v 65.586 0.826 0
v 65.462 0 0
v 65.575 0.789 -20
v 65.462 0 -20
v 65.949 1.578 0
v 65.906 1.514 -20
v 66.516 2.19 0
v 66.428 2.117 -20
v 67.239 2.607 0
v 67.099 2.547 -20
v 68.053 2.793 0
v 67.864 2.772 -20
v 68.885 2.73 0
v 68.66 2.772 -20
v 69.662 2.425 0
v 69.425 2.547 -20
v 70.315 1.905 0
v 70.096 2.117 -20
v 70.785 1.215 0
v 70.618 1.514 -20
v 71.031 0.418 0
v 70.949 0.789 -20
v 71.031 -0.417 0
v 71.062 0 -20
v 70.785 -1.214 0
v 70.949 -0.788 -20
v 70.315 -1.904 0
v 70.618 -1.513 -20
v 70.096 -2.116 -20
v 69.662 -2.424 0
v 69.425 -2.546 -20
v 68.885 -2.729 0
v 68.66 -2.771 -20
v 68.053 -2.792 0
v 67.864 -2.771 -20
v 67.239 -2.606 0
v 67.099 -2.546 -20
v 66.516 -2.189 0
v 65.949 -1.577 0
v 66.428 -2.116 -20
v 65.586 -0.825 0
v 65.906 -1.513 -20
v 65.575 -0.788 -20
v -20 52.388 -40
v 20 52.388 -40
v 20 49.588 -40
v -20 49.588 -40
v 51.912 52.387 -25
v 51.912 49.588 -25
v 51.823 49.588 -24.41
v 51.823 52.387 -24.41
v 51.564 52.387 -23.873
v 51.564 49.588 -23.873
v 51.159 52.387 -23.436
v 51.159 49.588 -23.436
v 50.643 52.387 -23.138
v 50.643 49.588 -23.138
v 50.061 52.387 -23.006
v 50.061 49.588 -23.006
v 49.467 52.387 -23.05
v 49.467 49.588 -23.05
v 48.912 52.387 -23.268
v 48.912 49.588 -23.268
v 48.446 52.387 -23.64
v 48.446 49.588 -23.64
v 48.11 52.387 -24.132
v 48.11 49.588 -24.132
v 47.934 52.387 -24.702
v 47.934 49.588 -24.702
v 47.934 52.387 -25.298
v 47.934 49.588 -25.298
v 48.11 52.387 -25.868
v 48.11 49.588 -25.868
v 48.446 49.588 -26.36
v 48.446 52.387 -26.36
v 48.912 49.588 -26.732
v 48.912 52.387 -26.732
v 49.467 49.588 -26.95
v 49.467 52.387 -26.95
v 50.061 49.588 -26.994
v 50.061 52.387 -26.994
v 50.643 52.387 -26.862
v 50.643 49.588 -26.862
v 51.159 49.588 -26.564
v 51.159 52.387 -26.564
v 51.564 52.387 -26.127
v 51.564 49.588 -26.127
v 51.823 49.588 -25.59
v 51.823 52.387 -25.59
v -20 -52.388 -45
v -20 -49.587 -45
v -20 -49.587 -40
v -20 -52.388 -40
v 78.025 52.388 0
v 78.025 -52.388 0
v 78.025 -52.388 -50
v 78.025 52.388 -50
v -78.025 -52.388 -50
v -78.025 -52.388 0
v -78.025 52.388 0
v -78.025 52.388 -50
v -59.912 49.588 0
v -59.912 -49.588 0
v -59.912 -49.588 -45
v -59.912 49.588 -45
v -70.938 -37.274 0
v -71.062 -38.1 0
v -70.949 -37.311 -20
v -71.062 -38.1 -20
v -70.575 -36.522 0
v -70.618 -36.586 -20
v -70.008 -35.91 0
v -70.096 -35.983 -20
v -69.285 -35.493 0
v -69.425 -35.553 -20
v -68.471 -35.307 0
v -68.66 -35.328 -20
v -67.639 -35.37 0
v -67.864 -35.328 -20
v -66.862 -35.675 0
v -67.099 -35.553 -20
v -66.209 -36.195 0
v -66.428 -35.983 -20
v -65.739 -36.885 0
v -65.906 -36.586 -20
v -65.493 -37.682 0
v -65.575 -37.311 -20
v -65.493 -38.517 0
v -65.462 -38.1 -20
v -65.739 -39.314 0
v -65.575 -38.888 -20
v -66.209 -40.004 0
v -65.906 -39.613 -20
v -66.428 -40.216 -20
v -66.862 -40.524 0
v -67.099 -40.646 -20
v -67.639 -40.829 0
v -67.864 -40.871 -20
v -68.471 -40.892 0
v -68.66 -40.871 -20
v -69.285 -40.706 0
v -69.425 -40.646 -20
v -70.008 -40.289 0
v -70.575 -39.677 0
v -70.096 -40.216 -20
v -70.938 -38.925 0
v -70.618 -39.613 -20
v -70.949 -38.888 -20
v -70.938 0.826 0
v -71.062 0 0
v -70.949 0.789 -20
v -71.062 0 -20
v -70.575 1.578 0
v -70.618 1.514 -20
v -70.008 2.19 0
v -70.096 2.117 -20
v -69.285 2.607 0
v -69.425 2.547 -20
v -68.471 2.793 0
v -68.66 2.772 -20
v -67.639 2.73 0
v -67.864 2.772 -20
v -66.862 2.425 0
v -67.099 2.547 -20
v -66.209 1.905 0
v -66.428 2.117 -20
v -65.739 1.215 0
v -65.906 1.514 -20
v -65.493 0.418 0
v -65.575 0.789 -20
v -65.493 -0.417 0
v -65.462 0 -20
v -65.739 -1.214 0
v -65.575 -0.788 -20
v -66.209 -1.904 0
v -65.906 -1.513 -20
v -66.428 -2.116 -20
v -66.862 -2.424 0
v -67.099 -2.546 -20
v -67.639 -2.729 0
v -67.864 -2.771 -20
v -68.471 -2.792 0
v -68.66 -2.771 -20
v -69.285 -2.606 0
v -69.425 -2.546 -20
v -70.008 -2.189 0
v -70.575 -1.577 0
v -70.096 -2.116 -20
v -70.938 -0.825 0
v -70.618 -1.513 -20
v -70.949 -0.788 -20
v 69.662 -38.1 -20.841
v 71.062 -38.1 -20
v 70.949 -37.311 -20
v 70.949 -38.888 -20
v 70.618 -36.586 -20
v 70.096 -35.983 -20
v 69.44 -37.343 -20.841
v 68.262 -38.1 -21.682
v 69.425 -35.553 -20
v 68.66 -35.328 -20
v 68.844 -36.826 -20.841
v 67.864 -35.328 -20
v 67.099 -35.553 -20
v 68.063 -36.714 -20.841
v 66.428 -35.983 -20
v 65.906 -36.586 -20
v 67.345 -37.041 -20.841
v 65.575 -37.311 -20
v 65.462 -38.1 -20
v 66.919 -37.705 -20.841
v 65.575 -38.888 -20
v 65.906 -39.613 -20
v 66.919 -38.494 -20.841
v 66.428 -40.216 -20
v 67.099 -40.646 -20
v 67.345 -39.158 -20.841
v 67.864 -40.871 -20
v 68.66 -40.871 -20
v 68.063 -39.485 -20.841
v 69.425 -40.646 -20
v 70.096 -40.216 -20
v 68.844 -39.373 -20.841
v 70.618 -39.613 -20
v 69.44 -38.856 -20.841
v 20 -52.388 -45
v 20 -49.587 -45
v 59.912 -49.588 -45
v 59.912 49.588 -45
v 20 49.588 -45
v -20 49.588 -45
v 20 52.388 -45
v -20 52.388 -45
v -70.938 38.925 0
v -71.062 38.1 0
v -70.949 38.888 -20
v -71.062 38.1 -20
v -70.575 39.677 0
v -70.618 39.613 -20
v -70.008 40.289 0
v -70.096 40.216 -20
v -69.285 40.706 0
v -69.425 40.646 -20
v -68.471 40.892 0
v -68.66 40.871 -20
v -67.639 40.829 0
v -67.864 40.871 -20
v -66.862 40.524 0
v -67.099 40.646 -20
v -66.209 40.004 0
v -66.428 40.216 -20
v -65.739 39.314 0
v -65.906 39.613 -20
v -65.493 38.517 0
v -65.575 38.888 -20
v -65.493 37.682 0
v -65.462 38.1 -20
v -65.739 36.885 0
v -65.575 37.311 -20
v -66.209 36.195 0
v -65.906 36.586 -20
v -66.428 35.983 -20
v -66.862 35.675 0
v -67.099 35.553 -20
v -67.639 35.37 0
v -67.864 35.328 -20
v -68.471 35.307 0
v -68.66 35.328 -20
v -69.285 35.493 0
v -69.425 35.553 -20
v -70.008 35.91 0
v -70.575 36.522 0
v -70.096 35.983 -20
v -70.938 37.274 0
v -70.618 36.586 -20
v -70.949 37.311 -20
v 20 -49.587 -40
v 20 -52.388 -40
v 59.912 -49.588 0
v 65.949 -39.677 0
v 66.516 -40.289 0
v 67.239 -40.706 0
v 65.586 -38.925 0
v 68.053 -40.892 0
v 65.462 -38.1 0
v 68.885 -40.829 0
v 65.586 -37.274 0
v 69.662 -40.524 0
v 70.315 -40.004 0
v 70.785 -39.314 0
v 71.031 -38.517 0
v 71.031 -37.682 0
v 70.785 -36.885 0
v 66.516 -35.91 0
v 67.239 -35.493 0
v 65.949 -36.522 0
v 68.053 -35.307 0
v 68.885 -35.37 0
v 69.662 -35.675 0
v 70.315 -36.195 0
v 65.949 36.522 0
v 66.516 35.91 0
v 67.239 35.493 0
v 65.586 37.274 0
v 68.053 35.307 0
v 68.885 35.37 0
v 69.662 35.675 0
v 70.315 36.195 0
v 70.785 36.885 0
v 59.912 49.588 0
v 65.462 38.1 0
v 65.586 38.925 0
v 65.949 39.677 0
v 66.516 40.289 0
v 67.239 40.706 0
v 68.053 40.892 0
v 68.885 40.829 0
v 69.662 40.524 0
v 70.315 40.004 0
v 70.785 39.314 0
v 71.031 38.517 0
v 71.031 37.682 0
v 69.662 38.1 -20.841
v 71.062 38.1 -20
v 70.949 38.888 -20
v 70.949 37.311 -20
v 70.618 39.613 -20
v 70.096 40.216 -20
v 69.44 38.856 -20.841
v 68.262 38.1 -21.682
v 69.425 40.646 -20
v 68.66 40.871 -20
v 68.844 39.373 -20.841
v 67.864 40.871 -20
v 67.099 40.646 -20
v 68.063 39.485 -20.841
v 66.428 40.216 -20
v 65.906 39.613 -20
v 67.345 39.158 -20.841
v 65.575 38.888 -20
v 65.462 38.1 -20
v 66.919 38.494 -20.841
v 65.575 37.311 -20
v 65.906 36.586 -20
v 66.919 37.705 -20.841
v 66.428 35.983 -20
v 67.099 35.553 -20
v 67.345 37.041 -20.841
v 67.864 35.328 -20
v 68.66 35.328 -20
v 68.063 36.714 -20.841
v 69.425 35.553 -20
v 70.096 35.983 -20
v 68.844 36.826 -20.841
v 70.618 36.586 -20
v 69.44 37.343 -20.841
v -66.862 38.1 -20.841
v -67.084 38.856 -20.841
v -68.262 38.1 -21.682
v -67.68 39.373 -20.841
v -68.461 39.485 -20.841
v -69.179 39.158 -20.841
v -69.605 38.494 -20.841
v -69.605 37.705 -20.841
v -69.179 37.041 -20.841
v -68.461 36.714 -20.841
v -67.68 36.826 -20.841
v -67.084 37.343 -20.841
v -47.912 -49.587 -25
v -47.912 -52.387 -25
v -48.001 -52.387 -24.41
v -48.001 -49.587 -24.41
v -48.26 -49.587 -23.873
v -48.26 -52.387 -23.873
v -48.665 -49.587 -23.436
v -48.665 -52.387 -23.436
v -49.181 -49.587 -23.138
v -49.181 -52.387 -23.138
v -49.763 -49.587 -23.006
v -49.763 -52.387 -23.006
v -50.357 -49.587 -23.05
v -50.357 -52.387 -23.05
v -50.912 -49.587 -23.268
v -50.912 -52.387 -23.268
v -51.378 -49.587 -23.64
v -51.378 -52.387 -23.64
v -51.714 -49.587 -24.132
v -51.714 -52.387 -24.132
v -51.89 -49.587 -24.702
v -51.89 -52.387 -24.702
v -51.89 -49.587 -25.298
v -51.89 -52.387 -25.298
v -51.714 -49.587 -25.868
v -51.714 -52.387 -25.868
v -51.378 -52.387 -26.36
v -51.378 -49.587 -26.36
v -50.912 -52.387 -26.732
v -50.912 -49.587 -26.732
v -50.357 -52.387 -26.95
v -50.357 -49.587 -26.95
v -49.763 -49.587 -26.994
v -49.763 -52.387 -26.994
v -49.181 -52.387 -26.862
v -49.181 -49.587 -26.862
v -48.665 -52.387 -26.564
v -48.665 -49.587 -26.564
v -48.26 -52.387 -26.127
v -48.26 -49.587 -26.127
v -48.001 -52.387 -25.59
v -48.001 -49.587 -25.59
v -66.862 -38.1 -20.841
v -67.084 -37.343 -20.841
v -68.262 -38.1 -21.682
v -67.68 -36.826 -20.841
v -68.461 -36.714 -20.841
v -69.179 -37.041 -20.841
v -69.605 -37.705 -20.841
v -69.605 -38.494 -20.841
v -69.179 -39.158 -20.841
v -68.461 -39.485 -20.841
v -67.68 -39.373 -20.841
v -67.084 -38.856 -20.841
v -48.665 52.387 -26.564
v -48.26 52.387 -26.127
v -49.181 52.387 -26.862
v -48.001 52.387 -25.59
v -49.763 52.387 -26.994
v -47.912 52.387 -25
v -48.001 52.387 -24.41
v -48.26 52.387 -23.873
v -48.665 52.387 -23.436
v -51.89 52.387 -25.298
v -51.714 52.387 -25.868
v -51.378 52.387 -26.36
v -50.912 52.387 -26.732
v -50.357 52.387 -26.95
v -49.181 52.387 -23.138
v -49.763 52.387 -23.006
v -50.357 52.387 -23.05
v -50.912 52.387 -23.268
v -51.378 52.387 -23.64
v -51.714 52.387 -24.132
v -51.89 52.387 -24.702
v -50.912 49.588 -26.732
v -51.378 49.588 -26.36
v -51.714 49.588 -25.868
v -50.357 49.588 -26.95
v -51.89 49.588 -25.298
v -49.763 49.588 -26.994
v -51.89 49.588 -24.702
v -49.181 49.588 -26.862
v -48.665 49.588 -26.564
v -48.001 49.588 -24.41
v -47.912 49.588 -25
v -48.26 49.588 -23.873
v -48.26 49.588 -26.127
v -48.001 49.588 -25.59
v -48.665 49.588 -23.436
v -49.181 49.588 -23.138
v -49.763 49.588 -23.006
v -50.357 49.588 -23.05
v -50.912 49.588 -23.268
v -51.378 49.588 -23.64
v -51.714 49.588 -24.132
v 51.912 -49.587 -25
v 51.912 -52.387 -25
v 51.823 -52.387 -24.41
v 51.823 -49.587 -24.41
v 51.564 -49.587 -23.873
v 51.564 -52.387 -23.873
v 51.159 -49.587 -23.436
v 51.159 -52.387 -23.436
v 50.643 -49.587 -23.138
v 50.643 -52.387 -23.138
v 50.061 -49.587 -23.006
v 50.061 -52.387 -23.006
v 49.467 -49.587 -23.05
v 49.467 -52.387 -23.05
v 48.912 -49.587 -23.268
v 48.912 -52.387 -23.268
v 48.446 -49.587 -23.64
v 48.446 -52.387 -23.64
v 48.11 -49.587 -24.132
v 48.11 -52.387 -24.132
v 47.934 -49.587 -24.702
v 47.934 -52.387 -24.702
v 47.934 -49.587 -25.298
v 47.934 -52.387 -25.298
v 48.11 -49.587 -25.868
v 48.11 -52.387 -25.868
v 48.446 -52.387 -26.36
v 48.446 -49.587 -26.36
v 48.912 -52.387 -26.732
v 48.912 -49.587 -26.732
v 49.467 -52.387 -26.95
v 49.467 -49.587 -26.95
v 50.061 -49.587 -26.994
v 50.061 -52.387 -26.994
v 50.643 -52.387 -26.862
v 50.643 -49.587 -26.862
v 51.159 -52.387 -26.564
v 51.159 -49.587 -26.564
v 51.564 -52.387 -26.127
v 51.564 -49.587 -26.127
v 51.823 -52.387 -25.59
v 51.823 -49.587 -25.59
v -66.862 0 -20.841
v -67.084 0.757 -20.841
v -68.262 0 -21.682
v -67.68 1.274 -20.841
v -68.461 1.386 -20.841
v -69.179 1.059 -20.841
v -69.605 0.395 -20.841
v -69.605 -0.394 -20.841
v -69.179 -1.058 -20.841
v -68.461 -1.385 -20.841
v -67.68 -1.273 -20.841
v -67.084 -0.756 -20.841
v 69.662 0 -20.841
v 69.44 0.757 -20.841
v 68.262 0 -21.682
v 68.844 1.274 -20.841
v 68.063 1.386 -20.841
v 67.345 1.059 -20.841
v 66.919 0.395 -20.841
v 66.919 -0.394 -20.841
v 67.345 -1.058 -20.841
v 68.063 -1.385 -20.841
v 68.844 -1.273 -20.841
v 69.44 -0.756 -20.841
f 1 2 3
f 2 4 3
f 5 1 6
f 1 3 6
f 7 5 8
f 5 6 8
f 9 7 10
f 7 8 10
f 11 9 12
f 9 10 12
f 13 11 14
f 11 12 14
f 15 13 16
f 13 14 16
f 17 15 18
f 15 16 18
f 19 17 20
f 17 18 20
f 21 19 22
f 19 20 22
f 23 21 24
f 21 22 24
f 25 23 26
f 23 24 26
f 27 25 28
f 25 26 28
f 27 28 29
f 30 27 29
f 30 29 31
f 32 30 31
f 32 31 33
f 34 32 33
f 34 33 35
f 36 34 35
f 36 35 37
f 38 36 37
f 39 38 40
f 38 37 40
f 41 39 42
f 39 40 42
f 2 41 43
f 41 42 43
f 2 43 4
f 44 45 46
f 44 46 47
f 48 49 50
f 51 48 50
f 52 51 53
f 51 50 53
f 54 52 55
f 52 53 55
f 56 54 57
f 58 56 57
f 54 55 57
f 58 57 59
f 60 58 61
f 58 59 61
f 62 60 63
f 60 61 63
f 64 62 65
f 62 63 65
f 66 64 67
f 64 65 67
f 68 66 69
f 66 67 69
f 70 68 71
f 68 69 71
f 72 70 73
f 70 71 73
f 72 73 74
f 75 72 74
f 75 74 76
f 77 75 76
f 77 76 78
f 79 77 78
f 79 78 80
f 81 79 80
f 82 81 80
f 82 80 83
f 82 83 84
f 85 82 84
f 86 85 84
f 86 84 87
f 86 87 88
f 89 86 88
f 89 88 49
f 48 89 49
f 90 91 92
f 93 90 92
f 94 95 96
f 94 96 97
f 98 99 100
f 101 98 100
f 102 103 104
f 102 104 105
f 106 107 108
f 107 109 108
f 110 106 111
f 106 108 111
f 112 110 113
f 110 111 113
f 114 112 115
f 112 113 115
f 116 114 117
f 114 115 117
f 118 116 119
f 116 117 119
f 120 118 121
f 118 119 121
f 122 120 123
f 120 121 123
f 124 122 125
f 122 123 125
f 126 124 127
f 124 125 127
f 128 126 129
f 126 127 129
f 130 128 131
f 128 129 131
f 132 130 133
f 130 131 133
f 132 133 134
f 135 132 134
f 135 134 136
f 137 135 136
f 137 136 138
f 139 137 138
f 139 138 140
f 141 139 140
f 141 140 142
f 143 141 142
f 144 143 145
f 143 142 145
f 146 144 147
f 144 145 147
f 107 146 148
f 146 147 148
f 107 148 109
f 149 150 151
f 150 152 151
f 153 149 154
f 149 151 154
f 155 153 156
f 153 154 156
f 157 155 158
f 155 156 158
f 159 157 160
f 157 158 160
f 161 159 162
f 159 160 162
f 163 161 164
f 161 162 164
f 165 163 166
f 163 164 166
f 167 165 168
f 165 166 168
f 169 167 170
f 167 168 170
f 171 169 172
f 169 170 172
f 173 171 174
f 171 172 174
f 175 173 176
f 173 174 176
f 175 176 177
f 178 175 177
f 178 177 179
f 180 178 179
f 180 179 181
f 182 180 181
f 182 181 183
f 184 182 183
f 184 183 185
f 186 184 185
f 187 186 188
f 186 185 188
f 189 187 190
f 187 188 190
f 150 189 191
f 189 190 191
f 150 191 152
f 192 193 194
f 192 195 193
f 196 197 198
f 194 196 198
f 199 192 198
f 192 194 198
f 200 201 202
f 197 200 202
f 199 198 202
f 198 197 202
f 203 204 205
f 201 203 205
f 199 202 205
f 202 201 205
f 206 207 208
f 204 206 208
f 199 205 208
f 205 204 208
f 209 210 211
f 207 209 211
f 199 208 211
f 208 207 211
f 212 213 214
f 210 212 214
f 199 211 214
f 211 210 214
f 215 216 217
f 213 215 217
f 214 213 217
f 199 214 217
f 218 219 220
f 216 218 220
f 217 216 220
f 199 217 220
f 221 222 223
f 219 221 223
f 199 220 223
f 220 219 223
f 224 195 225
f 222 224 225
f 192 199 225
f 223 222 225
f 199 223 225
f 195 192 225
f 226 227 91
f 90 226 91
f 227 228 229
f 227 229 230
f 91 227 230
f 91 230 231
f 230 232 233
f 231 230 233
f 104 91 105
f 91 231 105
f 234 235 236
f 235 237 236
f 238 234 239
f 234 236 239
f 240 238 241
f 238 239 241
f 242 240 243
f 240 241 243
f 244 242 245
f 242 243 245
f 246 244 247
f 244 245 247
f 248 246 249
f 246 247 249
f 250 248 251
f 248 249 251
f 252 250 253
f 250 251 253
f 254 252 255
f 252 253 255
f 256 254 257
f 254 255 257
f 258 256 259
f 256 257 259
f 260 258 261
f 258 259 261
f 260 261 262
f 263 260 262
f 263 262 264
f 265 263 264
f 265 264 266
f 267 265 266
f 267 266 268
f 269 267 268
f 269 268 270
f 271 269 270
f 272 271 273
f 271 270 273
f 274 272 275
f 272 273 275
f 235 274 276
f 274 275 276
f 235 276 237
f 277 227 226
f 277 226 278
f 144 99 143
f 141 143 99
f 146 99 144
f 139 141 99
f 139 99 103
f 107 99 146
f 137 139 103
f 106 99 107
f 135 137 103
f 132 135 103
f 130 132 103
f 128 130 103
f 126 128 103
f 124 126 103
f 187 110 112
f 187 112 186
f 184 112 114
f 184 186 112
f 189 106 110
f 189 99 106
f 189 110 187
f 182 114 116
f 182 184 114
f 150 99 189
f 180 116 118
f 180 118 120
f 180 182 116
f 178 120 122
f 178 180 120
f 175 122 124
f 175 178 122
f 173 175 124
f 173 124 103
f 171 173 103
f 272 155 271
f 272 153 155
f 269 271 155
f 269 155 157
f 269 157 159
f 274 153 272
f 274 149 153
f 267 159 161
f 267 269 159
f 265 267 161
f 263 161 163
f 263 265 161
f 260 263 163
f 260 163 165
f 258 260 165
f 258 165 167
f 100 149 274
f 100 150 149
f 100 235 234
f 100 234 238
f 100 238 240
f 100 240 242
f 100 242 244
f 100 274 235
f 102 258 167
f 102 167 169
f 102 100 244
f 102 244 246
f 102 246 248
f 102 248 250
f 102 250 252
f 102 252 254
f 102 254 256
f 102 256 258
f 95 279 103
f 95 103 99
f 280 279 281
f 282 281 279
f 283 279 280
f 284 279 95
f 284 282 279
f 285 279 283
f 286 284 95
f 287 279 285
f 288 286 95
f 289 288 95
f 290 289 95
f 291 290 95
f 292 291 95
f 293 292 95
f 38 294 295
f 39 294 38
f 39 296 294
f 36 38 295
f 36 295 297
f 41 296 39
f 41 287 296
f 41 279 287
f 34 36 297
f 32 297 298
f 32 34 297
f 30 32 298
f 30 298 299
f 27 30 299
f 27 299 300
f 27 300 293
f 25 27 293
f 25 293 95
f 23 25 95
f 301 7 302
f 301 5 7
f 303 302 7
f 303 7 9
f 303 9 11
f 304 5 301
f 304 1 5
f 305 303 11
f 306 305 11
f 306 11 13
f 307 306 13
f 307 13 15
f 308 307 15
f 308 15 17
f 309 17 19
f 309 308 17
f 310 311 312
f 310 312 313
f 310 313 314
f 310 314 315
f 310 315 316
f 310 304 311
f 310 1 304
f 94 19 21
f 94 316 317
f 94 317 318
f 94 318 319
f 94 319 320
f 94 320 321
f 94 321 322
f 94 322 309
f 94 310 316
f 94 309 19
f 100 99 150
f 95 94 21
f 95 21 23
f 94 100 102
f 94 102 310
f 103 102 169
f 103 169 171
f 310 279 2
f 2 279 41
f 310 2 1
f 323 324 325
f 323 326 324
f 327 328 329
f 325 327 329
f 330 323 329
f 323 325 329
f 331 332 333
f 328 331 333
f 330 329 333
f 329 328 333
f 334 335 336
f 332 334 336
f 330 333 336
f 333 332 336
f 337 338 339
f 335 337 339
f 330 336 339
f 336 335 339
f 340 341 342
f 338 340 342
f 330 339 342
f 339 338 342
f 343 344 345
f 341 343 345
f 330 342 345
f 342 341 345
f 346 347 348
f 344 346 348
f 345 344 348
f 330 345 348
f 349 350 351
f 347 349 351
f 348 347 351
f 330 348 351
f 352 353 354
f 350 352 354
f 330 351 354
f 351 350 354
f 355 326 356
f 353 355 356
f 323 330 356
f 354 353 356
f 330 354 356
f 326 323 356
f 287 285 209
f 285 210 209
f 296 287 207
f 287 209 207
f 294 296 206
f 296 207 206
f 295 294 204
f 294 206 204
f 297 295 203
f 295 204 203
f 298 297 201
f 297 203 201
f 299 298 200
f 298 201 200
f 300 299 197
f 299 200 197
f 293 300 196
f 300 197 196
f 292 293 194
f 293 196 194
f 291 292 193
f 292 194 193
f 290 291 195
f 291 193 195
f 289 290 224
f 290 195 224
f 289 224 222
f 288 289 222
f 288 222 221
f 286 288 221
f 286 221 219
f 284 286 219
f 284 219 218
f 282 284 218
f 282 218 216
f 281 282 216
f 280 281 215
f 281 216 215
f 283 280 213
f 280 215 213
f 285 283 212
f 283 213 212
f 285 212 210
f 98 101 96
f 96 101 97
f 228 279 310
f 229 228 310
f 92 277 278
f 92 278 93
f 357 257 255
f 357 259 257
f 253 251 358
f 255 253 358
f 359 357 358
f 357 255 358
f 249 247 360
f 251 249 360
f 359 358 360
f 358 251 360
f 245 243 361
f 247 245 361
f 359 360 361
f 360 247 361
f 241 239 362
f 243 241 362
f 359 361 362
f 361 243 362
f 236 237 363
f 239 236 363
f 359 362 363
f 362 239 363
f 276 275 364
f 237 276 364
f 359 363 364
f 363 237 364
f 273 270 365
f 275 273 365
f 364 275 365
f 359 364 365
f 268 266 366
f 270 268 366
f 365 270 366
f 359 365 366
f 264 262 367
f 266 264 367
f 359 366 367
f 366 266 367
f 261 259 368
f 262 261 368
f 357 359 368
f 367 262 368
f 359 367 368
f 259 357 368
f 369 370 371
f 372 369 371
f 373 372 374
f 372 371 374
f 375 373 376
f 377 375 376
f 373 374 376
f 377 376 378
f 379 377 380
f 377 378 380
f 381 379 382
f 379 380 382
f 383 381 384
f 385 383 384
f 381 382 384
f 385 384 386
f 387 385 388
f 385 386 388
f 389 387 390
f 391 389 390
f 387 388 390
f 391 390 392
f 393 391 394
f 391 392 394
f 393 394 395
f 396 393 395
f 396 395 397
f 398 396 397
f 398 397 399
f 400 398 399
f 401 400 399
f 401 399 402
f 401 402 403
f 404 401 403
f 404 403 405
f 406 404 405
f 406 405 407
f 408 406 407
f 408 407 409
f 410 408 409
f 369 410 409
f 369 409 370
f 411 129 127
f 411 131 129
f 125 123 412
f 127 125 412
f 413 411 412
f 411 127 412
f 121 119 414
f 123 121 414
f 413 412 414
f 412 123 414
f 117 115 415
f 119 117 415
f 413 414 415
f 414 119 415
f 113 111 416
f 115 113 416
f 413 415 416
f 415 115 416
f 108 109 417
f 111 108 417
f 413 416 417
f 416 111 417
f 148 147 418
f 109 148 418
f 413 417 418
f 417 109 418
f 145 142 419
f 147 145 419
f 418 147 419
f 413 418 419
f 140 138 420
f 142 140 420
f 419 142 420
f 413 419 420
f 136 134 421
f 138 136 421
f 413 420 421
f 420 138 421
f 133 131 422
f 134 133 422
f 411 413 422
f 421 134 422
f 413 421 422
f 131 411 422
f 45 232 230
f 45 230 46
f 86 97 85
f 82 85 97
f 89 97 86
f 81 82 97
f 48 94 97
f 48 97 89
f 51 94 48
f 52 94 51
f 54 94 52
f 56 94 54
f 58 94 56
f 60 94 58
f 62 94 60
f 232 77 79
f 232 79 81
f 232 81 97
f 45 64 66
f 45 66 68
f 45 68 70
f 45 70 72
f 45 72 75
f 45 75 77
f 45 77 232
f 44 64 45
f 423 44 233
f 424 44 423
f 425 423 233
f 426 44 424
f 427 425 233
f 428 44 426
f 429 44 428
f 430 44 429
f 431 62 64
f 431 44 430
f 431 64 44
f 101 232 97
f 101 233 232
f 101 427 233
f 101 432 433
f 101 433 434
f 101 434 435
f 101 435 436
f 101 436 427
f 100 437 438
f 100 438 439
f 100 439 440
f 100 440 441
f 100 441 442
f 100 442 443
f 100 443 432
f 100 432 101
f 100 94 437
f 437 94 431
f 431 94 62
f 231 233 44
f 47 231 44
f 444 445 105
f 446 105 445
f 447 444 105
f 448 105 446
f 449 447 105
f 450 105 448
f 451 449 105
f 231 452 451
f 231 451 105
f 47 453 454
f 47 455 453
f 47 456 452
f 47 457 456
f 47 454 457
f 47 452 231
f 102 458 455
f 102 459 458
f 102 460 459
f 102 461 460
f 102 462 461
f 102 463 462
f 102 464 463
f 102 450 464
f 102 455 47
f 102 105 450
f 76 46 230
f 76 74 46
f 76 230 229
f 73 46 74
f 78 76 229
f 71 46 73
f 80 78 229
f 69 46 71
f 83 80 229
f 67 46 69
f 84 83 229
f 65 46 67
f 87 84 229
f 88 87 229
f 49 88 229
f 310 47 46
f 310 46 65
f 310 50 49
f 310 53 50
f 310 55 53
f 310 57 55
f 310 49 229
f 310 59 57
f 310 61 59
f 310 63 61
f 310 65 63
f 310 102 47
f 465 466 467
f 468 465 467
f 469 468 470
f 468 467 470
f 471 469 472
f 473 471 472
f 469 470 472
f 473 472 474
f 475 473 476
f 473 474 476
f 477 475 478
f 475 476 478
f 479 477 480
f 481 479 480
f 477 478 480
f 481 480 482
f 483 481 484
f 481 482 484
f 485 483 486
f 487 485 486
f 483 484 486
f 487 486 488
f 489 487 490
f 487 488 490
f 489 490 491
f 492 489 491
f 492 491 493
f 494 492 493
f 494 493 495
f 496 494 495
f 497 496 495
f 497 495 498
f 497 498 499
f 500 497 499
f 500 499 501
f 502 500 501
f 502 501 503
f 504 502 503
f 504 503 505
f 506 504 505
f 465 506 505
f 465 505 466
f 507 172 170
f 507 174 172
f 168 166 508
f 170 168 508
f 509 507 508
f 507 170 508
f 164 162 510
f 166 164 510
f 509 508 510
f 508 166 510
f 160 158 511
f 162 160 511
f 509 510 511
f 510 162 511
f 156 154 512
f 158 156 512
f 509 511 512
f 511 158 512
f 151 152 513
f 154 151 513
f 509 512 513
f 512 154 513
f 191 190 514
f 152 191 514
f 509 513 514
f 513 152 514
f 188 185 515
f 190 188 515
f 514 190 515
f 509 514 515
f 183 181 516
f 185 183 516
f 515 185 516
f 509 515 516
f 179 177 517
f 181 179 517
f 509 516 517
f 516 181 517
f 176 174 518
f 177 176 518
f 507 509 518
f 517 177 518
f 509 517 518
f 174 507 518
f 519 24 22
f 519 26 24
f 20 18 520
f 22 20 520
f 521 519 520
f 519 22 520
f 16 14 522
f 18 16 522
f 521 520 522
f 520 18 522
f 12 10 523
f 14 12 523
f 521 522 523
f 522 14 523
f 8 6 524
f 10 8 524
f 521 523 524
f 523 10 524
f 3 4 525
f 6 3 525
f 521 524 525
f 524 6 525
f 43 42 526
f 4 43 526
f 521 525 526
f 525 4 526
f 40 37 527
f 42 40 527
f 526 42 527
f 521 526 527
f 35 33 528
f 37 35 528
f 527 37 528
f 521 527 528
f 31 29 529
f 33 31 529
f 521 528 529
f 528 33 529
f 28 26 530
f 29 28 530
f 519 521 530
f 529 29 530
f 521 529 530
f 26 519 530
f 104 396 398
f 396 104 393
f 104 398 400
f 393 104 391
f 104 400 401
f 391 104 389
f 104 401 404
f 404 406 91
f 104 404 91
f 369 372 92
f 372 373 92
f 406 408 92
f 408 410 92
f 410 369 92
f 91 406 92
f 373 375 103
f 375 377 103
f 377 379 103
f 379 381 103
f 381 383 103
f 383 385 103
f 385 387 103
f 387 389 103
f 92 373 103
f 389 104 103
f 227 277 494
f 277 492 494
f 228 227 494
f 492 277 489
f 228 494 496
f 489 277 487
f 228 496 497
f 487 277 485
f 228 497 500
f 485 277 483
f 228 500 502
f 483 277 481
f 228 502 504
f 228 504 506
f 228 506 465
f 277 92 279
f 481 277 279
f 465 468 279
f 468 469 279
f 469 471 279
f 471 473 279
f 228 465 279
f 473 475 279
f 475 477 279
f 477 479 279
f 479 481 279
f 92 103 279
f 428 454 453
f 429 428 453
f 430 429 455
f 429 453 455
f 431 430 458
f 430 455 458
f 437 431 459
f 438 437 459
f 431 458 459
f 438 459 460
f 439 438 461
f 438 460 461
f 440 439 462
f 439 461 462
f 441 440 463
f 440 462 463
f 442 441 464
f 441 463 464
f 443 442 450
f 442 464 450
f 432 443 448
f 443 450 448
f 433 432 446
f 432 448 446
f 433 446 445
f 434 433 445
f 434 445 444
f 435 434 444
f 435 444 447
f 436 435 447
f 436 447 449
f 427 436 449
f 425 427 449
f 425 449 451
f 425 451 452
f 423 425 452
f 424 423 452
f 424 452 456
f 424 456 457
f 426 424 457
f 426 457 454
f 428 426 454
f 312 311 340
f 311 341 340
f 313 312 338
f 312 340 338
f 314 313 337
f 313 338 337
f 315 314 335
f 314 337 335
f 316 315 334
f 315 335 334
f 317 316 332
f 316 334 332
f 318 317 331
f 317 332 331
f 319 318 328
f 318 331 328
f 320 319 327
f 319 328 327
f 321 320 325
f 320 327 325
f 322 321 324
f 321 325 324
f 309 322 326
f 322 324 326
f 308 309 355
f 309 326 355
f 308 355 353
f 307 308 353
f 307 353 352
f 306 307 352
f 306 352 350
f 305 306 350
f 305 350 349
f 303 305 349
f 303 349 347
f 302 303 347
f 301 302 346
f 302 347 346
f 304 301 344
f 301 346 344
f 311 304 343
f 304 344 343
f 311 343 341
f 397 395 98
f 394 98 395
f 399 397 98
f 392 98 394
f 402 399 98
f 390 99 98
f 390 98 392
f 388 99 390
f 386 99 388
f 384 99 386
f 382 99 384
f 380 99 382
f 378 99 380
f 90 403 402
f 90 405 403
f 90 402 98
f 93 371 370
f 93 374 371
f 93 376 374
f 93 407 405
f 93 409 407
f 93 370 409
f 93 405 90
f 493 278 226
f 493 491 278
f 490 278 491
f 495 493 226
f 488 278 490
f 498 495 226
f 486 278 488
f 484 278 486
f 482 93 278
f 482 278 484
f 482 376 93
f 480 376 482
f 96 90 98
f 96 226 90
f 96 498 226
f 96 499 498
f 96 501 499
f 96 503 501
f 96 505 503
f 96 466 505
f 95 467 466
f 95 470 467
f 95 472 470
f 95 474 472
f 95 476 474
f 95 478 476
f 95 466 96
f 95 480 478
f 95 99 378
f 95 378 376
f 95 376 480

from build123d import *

# Parameters (mm, degrees)
F0_W     = 5
F0_H     = 104.775
F0_W_2   = 146.05
F0_R     = 3.24
F1_DEPTH = 50
F2_W     = 119.824
F2_H     = 99.175
F3_DEPTH = 45
F4_D     = 5.6
F4_DEPTH = 20
F4_TIP   = 1.6824097333
F5_W     = 40
F5_H     = 5
F6_DEPTH = 104.776
F7_D     = 4


with BuildPart() as f1:
    # F0 (on Top) → F1 (new body)
    with BuildSketch(Plane.XY):
        with Locations((-75.525, 0)):
            Rectangle(F0_W, F0_H)
        Rectangle(F0_W_2, F0_H)
        with Locations((-68.262, -38.0995)):
            Circle(F0_R, mode=Mode.SUBTRACT)
        with Locations((68.262, -38.0995)):
            Circle(F0_R, mode=Mode.SUBTRACT)
        with Locations((-68.262, 0.0005)):
            Circle(F0_R, mode=Mode.SUBTRACT)
        with BuildLine():
            ThreePointArc((68.262, 44.4495), (61.912, 38.0995), (68.262, 31.7495))
            Line((68.262, 31.7495), (72.225, 31.7495))
            Line((72.225, 31.7495), (72.225, 6.3505))
            Line((72.225, 6.3505), (68.262, 6.3505))
            ThreePointArc((68.262, 6.3505), (61.912, 0.0005), (68.262, -6.3495))
            Line((68.262, -6.3495), (72.225, -6.3495))
            Line((72.225, -6.3495), (72.225, -31.7495))
            Line((72.225, -31.7495), (68.262, -31.7495))
            ThreePointArc((68.262, -31.7495), (61.912, -38.0995), (68.262, -44.4495))
            Line((68.262, -44.4495), (72.225, -44.4495))
            Line((72.225, -44.4495), (72.225, -51.5875))
            Line((72.225, -51.5875), (-72.225, -51.5875))
            Line((-72.225, -51.5875), (-72.225, -44.4495))
            Line((-72.225, -44.4495), (-68.262, -44.4495))
            ThreePointArc((-68.262, -44.4495), (-61.912, -38.0995), (-68.262, -31.7495))
            Line((-68.262, -31.7495), (-72.225, -31.7495))
            Line((-72.225, -31.7495), (-72.225, -6.3495))
            Line((-72.225, -6.3495), (-68.262, -6.3495))
            ThreePointArc((-68.262, -6.3495), (-61.912, 0.0005), (-68.262, 6.3505))
            Line((-68.262, 6.3505), (-72.225, 6.3505))
            Line((-72.225, 6.3505), (-72.225, 31.7495))
            Line((-72.225, 31.7495), (-68.262, 31.7495))
            ThreePointArc((-68.262, 31.7495), (-61.912, 38.0995), (-68.262, 44.4495))
            Line((-68.262, 44.4495), (-72.225, 44.4495))
            Line((-72.225, 44.4495), (-72.225, 51.5875))
            Line((-72.225, 51.5875), (72.225, 51.5875))
            Line((72.225, 51.5875), (72.225, 44.4495))
            Line((72.225, 44.4495), (68.262, 44.4495))
        make_face(mode=Mode.SUBTRACT)
        with Locations((-68.262, 38.0995)):
            Circle(F0_R, mode=Mode.SUBTRACT)
        with Locations((68.262, 0.0005)):
            Circle(F0_R, mode=Mode.SUBTRACT)
        with Locations((68.262, 38.0995)):
            Circle(F0_R, mode=Mode.SUBTRACT)
        with Locations((75.525, 0)):
            Rectangle(F0_W, F0_H)
        with Locations((-68.262, 38.0995)):
            Circle(F0_R)
        with BuildLine():
            Line((72.225, 31.7495), (68.262, 31.7495))
            ThreePointArc((68.262, 31.7495), (61.912, 38.0995), (68.262, 44.4495))
            Line((68.262, 44.4495), (72.225, 44.4495))
            Line((72.225, 44.4495), (72.225, 51.5875))
            Line((72.225, 51.5875), (-72.225, 51.5875))
            Line((-72.225, 51.5875), (-72.225, 44.4495))
            Line((-72.225, 44.4495), (-68.262, 44.4495))
            ThreePointArc((-68.262, 44.4495), (-61.912, 38.0995), (-68.262, 31.7495))
            Line((-68.262, 31.7495), (-72.225, 31.7495))
            Line((-72.225, 31.7495), (-72.225, 6.3505))
            Line((-72.225, 6.3505), (-68.262, 6.3505))
            ThreePointArc((-68.262, 6.3505), (-61.912, 0.0005), (-68.262, -6.3495))
            Line((-68.262, -6.3495), (-72.225, -6.3495))
            Line((-72.225, -6.3495), (-72.225, -31.7495))
            Line((-72.225, -31.7495), (-68.262, -31.7495))
            ThreePointArc((-68.262, -31.7495), (-61.912, -38.0995), (-68.262, -44.4495))
            Line((-68.262, -44.4495), (-72.225, -44.4495))
            Line((-72.225, -44.4495), (-72.225, -51.5875))
            Line((-72.225, -51.5875), (72.225, -51.5875))
            Line((72.225, -51.5875), (72.225, -44.4495))
            Line((72.225, -44.4495), (68.262, -44.4495))
            ThreePointArc((68.262, -44.4495), (61.912, -38.0995), (68.262, -31.7495))
            Line((68.262, -31.7495), (72.225, -31.7495))
            Line((72.225, -31.7495), (72.225, -6.3495))
            Line((72.225, -6.3495), (68.262, -6.3495))
            ThreePointArc((68.262, -6.3495), (61.912, 0.0005), (68.262, 6.3505))
            Line((68.262, 6.3505), (72.225, 6.3505))
            Line((72.225, 6.3505), (72.225, 31.7495))
        make_face()
        with Locations((-68.262, 0.0005)):
            Circle(F0_R)
        with Locations((-68.262, -38.0995)):
            Circle(F0_R)
        with Locations((68.262, -38.0995)):
            Circle(F0_R)
        with Locations((68.262, 0.0005)):
            Circle(F0_R)
        with Locations((68.262, 38.0995)):
            Circle(F0_R)
    extrude(amount=-F1_DEPTH)

    # F2 (on face) → F3 (cut)
    with BuildSketch(Plane.XY):
        Rectangle(F2_W, F2_H)
    extrude(amount=-F3_DEPTH, mode=Mode.SUBTRACT)

    # F4
    with Locations(Plane.XY):
        with Locations((-68.262, 38.0995), (-68.262, 0.0005), (-68.262, -38.0995), (68.262, -38.0995), (68.262, 38.0995), (68.262, 0.0005)):
            Hole(F4_D / 2, depth=F4_DEPTH)
            with Locations((0, 0, -(F4_DEPTH + F4_TIP / 2))):  # 118° drill point
                Cone(0, F4_D / 2, F4_TIP, mode=Mode.SUBTRACT)

    # F5 (on face) → F6 (cut, through all)
    with BuildSketch(Plane(origin=(0, 52.3875, 0), x_dir=(-1, 0, 0), z_dir=(0, 1, 0))):
        with Locations((0, -42.5)):
            Rectangle(F5_W, F5_H)
    extrude(amount=-F6_DEPTH, mode=Mode.SUBTRACT)

    # F7 (through all)
    with Locations(Plane(origin=(0, 52.3875, 0), x_dir=(-1, 0, 0), z_dir=(0, 1, 0))):
        with Locations((-49.912, -25), (49.912, -25)):
            Hole(F7_D / 2)


solid = f1.part
